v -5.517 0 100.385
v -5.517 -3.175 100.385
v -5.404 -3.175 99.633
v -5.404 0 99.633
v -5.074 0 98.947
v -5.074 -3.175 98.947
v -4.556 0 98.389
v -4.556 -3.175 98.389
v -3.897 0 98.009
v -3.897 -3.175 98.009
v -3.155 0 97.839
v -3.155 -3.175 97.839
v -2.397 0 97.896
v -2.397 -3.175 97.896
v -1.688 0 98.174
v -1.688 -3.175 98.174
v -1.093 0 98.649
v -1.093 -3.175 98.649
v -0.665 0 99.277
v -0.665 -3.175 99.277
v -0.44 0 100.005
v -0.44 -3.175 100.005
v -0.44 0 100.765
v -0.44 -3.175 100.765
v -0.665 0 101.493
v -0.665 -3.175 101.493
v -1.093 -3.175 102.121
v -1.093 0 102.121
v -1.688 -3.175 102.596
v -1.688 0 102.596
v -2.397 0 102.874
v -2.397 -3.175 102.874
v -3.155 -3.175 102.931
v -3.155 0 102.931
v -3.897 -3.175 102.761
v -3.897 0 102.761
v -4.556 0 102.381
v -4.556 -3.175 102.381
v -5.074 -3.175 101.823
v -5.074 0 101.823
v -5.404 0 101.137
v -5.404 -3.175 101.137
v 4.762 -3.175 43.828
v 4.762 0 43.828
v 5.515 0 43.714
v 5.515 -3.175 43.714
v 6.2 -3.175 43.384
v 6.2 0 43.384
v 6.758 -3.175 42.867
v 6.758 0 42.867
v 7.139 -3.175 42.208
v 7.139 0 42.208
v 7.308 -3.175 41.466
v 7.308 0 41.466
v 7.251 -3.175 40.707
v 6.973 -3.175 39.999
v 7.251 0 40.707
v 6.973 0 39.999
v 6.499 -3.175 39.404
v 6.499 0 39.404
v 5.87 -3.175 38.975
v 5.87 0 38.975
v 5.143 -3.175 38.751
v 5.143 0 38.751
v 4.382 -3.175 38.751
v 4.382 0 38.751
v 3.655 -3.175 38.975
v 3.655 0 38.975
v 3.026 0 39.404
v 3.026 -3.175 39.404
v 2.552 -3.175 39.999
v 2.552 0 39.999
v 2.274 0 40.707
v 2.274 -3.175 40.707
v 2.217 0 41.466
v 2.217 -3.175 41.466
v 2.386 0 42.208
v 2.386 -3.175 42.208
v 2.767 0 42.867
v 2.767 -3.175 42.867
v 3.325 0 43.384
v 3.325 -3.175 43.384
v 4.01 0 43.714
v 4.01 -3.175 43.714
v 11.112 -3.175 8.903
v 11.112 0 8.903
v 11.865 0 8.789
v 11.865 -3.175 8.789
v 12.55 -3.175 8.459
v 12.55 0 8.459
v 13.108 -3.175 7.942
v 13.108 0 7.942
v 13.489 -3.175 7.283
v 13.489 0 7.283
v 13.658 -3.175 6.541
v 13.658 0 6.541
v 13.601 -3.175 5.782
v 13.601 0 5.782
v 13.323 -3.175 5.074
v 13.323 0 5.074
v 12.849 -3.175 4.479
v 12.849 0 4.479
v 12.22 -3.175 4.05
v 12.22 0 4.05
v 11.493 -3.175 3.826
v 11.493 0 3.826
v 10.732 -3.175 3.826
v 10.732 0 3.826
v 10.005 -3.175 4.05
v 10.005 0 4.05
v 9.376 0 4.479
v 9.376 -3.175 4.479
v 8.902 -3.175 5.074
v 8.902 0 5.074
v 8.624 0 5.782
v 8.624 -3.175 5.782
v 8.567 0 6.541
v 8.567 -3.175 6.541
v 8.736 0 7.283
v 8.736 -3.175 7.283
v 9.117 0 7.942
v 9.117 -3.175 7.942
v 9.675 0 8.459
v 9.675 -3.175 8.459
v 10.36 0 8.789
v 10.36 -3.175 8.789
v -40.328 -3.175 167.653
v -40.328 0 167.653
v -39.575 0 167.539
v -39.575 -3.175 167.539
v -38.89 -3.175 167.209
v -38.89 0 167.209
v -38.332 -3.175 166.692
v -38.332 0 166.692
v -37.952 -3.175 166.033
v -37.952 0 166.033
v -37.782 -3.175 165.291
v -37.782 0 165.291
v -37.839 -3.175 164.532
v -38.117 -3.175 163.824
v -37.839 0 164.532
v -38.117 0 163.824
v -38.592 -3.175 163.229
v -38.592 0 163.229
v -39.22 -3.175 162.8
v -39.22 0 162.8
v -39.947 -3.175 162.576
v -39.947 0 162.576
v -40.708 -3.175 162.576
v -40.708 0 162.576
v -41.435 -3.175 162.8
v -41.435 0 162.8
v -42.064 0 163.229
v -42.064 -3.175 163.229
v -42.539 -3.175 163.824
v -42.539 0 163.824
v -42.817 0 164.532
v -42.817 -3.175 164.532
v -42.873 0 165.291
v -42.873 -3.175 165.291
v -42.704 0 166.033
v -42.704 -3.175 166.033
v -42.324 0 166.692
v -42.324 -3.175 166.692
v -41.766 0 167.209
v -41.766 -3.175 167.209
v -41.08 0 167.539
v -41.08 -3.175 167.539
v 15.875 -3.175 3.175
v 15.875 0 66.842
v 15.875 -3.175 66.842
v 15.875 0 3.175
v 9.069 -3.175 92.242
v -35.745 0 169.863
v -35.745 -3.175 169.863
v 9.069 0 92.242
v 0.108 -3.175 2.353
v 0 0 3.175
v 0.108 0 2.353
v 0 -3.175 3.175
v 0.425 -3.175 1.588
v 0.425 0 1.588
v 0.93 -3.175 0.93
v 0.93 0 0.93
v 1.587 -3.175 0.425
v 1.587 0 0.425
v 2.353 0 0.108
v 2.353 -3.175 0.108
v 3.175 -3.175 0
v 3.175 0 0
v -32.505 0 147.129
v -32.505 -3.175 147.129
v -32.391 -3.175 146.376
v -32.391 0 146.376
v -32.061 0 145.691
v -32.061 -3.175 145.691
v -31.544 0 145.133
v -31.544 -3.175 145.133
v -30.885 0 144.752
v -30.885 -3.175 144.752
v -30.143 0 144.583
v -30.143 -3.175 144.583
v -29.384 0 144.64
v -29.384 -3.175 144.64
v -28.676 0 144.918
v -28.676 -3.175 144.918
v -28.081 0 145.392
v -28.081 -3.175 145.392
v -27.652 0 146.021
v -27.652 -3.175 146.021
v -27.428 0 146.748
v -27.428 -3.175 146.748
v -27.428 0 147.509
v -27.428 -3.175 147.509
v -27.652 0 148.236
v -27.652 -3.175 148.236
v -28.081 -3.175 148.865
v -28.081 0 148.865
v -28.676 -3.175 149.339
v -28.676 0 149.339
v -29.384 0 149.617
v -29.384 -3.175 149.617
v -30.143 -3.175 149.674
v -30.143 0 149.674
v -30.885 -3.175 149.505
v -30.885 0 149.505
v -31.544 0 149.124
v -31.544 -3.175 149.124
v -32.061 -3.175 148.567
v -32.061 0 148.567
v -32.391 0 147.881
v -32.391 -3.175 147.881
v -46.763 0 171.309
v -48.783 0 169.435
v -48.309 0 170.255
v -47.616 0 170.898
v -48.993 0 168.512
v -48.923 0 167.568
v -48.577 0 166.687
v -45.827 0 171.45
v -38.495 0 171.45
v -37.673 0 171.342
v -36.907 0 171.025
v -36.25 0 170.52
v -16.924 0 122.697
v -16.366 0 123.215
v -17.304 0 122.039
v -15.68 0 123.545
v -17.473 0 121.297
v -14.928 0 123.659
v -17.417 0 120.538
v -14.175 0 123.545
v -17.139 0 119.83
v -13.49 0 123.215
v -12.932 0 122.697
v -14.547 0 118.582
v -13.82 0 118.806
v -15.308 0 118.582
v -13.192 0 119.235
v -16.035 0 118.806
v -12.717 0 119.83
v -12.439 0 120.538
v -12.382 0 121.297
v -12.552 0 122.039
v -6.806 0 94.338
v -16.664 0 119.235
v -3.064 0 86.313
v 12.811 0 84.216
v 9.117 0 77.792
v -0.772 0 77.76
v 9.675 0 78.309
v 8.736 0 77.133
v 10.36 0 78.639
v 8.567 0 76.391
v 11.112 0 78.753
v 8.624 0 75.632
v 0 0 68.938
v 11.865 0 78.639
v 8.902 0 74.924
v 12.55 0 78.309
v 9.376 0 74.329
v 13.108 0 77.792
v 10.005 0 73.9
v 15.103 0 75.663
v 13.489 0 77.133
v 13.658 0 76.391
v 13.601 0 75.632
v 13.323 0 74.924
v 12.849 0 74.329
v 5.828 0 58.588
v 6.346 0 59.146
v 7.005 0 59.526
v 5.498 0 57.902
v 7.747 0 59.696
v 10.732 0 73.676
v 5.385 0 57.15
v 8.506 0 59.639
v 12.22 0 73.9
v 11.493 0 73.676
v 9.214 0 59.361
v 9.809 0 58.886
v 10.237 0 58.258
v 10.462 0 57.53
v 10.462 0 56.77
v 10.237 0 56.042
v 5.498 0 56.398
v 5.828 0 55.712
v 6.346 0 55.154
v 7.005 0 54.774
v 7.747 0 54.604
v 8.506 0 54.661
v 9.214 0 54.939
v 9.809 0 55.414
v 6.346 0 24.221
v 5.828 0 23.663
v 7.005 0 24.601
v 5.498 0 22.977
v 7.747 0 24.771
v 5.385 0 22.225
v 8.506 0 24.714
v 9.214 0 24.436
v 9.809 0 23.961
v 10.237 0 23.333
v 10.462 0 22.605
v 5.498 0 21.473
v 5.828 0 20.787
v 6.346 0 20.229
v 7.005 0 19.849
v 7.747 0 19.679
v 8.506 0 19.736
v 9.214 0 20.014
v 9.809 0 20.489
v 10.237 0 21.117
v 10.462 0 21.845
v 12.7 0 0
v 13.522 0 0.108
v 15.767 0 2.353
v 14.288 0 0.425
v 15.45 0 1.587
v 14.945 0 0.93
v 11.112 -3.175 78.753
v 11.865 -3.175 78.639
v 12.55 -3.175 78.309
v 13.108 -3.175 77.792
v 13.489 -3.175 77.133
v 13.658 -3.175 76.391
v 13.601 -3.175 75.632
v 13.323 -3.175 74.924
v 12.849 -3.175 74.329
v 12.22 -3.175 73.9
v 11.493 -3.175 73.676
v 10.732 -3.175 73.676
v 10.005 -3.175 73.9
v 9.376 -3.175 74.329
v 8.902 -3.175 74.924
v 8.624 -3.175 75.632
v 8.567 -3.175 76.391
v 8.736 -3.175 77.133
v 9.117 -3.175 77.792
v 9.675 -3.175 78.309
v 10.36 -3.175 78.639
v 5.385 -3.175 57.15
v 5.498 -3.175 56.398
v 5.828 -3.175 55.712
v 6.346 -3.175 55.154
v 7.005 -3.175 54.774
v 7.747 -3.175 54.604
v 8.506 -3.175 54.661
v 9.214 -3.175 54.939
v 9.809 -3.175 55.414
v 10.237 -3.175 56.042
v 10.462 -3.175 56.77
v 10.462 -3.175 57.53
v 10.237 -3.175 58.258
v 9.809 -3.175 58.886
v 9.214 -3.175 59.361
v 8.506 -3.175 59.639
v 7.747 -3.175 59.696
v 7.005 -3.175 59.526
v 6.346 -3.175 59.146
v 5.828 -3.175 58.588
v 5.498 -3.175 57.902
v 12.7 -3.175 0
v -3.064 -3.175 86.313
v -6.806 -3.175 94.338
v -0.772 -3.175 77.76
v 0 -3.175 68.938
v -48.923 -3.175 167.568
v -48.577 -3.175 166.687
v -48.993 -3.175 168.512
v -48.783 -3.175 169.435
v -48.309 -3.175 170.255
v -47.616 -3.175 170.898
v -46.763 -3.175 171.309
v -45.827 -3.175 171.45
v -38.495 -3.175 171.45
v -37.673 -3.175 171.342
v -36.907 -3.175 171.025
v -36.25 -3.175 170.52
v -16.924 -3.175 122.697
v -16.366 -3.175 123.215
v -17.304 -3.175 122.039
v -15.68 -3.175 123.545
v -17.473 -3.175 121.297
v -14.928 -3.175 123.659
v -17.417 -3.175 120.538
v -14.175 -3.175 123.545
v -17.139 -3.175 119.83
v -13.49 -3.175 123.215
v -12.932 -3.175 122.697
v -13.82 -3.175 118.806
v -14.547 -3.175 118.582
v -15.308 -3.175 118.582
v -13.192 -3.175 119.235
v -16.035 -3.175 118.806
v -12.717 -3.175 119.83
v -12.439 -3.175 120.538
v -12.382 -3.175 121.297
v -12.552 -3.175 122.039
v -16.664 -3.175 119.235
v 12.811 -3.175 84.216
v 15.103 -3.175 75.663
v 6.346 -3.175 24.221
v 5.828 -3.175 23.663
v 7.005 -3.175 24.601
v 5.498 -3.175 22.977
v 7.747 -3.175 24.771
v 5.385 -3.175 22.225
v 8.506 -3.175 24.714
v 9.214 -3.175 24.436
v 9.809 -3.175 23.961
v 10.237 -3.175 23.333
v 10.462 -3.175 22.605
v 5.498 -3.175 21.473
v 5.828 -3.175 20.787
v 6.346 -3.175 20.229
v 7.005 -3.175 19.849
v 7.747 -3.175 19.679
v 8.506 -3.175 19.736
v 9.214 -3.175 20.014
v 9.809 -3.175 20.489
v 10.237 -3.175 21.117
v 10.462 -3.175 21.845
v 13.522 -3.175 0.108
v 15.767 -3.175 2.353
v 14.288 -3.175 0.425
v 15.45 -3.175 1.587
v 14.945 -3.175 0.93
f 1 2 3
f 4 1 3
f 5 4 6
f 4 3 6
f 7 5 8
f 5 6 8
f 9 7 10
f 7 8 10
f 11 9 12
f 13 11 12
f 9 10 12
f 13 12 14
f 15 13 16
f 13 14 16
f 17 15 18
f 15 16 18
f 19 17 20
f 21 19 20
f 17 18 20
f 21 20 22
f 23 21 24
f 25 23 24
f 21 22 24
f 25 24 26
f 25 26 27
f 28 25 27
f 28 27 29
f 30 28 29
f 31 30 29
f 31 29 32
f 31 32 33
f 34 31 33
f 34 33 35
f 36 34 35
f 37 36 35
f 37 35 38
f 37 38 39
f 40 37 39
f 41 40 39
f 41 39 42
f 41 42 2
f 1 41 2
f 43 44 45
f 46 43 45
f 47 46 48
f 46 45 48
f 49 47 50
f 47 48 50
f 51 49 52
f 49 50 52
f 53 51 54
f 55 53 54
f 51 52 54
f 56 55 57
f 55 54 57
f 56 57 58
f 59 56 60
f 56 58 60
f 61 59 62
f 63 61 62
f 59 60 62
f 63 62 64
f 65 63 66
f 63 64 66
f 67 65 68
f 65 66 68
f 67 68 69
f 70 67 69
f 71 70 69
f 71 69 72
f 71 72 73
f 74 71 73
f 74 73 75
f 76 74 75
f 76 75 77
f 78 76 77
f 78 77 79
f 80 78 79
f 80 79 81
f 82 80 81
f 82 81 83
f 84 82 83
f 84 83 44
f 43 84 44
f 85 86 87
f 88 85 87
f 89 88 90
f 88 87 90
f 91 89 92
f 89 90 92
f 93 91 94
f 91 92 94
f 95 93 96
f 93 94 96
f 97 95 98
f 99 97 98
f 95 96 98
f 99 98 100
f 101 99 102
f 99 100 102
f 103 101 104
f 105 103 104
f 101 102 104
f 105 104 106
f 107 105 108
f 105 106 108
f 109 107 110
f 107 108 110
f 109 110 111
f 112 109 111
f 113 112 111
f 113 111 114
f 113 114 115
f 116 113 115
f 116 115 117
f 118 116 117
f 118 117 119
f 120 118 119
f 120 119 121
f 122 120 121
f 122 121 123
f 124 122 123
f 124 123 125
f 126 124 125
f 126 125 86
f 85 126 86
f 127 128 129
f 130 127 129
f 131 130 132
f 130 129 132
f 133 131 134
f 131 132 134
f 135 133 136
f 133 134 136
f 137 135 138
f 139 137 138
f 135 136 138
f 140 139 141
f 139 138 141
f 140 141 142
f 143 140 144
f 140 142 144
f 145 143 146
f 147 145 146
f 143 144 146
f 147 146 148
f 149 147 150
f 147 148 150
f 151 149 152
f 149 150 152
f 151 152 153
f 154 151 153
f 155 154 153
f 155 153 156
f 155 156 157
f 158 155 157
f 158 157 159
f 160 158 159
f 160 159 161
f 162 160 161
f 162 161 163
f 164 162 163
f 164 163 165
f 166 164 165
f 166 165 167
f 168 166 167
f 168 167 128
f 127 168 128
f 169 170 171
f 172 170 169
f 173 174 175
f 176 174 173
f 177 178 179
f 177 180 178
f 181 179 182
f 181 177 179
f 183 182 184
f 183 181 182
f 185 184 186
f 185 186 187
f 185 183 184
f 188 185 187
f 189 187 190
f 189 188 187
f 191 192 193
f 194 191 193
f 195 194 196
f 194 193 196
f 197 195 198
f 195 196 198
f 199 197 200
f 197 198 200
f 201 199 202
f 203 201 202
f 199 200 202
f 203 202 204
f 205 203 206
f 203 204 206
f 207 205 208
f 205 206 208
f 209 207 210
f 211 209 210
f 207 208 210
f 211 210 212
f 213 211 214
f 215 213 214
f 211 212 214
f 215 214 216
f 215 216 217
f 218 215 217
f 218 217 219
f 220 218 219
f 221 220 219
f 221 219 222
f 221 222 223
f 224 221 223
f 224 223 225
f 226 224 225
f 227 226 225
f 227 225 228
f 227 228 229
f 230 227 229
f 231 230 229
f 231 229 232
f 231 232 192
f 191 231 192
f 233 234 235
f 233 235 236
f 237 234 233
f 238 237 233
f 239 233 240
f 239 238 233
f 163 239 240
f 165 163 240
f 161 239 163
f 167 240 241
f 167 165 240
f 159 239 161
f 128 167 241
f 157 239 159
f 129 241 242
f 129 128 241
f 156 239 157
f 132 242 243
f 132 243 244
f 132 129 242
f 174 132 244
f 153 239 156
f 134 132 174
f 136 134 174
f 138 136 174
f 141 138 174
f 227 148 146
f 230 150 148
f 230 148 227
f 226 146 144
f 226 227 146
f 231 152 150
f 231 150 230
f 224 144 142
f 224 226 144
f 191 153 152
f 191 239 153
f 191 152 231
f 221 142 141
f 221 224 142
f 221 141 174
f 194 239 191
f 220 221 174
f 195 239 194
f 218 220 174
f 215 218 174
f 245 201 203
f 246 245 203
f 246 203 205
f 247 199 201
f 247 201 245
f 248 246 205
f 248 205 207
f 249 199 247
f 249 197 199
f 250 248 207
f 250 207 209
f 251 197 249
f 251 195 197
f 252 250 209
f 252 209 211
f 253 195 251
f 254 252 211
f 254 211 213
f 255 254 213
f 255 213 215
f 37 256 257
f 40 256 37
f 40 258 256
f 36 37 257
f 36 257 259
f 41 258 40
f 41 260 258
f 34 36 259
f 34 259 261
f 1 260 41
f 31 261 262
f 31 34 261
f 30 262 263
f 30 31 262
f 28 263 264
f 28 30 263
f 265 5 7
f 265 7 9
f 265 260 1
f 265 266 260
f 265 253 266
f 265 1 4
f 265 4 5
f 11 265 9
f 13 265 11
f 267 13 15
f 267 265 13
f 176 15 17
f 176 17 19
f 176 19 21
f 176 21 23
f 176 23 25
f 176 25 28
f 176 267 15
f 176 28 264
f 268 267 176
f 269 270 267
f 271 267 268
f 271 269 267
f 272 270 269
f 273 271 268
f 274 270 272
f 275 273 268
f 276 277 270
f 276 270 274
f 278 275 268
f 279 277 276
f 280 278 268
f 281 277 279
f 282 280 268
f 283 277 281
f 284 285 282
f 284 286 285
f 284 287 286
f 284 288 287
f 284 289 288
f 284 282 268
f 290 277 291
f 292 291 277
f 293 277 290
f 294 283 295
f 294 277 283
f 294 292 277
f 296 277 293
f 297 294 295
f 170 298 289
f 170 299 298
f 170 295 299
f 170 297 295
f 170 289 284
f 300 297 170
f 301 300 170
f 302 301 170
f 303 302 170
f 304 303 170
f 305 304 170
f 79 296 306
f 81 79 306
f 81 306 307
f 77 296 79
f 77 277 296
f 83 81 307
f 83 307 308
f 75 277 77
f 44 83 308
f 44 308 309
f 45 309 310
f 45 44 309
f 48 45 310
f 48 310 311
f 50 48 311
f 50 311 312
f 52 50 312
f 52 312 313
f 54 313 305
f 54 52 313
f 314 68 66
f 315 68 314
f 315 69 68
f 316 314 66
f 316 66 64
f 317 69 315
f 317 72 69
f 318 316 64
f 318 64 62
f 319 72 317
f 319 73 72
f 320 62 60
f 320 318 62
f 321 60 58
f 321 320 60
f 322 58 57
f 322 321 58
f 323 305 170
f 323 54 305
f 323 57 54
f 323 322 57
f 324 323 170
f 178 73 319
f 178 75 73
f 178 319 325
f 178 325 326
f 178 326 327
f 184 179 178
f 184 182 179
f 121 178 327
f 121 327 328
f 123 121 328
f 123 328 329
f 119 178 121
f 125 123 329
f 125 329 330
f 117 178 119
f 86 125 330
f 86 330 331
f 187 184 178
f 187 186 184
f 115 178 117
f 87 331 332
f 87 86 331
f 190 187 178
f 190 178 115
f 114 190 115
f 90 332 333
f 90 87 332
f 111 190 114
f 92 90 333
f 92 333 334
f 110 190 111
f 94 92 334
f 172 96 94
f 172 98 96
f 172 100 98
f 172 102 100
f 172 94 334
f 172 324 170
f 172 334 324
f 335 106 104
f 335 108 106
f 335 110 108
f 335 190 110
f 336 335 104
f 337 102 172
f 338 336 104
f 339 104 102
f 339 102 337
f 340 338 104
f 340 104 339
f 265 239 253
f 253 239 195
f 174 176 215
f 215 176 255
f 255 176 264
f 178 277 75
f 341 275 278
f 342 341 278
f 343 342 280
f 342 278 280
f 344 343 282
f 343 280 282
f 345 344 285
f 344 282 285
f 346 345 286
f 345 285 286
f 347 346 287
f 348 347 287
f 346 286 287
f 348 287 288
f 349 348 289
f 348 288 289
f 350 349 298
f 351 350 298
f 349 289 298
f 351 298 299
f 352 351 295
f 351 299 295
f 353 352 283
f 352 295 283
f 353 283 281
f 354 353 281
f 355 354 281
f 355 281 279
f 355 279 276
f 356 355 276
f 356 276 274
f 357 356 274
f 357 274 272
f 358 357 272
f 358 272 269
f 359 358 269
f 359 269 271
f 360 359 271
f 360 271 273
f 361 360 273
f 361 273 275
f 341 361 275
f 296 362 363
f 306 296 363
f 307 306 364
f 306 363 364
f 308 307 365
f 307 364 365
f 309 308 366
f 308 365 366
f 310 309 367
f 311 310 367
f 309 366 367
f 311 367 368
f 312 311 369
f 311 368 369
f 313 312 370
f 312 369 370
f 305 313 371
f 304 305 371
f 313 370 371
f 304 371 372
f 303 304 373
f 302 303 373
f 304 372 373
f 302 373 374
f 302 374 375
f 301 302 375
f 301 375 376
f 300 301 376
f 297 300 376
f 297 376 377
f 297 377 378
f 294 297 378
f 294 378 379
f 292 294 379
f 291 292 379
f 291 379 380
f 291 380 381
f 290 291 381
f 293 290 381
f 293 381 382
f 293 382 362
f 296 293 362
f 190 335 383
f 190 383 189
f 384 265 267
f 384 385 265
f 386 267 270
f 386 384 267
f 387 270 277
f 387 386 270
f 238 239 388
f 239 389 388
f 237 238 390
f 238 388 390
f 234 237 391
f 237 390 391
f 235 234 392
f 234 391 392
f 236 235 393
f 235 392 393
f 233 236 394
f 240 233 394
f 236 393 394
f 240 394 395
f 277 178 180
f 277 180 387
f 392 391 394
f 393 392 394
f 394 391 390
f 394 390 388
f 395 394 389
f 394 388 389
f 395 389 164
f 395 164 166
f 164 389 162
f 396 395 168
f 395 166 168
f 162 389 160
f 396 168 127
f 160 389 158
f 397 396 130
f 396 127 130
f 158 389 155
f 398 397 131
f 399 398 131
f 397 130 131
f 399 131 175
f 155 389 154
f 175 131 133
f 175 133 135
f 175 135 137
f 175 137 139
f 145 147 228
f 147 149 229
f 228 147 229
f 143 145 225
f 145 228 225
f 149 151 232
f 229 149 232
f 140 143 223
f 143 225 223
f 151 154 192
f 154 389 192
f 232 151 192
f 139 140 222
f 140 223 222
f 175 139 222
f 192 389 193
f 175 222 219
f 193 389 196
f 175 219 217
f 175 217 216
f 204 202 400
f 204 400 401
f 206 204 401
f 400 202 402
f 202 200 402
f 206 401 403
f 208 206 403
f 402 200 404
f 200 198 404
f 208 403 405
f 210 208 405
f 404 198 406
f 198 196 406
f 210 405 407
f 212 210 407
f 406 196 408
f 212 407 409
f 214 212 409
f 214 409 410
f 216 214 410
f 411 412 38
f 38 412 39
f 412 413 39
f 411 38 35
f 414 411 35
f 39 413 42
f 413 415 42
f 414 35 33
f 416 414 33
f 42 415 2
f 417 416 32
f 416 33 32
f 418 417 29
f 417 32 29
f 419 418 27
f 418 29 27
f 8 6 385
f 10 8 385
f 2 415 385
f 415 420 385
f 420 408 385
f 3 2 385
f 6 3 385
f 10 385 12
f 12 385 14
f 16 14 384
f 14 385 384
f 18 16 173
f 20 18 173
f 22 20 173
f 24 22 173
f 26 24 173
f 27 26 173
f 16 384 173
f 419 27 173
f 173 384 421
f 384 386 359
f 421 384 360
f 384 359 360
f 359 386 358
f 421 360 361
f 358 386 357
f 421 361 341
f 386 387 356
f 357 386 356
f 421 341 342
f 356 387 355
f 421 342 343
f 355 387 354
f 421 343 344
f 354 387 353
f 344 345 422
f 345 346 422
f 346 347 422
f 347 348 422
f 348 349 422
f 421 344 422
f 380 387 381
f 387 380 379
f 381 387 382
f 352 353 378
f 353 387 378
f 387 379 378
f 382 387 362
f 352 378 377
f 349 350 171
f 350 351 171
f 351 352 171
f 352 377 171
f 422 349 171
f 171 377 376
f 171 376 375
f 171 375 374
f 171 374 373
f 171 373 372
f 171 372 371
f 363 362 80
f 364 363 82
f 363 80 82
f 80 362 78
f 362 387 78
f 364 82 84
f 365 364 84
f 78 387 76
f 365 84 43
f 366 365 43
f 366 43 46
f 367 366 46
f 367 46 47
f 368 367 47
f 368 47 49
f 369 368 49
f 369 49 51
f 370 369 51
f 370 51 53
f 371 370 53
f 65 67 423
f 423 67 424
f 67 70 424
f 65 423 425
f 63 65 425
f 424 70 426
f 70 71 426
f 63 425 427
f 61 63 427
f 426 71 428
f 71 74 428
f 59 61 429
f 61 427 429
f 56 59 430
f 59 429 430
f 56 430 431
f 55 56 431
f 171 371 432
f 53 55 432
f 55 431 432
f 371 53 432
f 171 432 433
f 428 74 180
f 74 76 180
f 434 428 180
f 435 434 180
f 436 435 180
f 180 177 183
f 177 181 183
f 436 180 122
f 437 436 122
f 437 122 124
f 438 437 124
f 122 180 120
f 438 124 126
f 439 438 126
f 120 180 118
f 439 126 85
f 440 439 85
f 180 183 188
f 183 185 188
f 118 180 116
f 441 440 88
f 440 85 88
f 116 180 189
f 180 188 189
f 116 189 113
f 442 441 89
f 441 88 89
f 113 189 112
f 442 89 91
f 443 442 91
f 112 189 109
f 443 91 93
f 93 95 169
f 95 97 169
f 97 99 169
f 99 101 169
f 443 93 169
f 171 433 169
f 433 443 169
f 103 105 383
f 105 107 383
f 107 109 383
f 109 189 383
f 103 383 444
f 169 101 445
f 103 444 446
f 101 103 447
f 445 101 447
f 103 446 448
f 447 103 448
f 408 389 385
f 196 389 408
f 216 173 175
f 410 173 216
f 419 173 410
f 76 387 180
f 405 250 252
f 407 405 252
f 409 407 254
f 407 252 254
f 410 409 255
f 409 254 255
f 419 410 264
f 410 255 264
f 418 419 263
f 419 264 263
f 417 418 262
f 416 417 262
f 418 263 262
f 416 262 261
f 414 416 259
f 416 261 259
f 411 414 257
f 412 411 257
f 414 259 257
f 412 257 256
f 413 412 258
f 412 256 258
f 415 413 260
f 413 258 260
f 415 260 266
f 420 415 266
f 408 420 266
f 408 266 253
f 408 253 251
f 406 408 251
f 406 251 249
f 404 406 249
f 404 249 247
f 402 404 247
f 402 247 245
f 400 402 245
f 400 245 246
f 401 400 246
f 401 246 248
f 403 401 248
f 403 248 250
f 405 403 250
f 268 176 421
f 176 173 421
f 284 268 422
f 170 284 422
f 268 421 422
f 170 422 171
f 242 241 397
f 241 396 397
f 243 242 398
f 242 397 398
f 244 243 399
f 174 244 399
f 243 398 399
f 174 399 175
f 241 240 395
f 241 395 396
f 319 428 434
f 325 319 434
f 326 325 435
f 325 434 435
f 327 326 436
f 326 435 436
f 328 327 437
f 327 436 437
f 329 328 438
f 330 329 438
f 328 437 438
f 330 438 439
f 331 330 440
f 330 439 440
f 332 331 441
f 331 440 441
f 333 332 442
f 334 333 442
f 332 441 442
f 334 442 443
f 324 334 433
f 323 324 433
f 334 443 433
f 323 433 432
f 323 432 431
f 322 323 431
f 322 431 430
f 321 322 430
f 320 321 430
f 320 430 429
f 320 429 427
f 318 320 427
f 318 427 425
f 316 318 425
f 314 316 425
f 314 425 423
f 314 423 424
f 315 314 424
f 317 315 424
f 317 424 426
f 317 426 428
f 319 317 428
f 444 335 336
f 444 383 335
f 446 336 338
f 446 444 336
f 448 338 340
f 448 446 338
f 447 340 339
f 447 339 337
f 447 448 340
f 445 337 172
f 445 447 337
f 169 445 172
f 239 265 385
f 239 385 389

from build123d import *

# Parameters (mm, degrees)
BASE_FLANGE1_DEPTH     = 3.175
SKETCH6_R              = 2.5527
CUT_EXTRUDE1_DEPTH     = 179.996051516
FILLET1_R              = 3.175
FILLET2_R              = 50.8
F_10_CLEARANCE_HOLE1_D = 5.1054


# Sheet-metal steps are written as plain solids
with BuildPart() as part:
    # Sketch1 → Base-Flange1 (new body)
    with BuildSketch(Plane(origin=(0, 0, 0), x_dir=(1, 0, 0), z_dir=(0, 1, 0))):
        Polygon((0, -82.55), (-51.326438931, -171.45), (-36.661742094, -171.45), (15.875, -80.45369343), (15.875, 0), (0, 0), align=None)
    extrude(amount=-BASE_FLANGE1_DEPTH)

    # Sketch6 → Cut-Extrude1 (cut, through all)
    with BuildSketch(Plane(origin=(0, 0, 0), x_dir=(1, 0, 0), z_dir=(0, 1, 0))):
        with Locations(Location((-40.327916303, -165.1, 0), (0, 0, 270))):
            Circle(SKETCH6_R)
        with Locations(Location((-14.927916303, -121.105909488, 0), (0, 0, 270))):
            Circle(SKETCH6_R)
        with Locations(Location((11.1125, -6.35, 0), (0, 0, 270))):
            Circle(SKETCH6_R)
        with Locations(Location((4.7625, -41.275, 0), (0, 0, 270))):
            Circle(SKETCH6_R)
        with Locations(Location((11.1125, -76.2, 0), (0, 0, 270))):
            Circle(SKETCH6_R)
    extrude(amount=-CUT_EXTRUDE1_DEPTH, mode=Mode.SUBTRACT)

    # Fillet1
    fillet1_edges = [part.edges().sort_by_distance(p)[0] for p in [
        (-36.661742094, -1.5875, 171.45),
        (-51.326438931, -1.5875, 171.45),
        (0, -1.5875, 0),
        (15.875, -1.5875, 0),
    ]]
    fillet(fillet1_edges, radius=FILLET1_R)

    # Fillet2
    fillet2_edges = [part.edges().sort_by_distance(p)[0] for p in [
        (0, -1.5875, 82.55),
        (15.875, -1.5875, 80.45369343),
    ]]
    fillet(fillet2_edges, radius=FILLET2_R)

    # #10 Clearance Hole1 (through all)
    with Locations(Plane(origin=(0, 0, 0), x_dir=(1, 0, 0), z_dir=(0, 1, 0))):
        with Locations((7.9375, -22.225), (7.9375, -57.15), (-2.964677617, -100.384972261), (-29.952177617, -147.12869343)):
            Hole(F_10_CLEARANCE_HOLE1_D / 2)


solid = part.part
